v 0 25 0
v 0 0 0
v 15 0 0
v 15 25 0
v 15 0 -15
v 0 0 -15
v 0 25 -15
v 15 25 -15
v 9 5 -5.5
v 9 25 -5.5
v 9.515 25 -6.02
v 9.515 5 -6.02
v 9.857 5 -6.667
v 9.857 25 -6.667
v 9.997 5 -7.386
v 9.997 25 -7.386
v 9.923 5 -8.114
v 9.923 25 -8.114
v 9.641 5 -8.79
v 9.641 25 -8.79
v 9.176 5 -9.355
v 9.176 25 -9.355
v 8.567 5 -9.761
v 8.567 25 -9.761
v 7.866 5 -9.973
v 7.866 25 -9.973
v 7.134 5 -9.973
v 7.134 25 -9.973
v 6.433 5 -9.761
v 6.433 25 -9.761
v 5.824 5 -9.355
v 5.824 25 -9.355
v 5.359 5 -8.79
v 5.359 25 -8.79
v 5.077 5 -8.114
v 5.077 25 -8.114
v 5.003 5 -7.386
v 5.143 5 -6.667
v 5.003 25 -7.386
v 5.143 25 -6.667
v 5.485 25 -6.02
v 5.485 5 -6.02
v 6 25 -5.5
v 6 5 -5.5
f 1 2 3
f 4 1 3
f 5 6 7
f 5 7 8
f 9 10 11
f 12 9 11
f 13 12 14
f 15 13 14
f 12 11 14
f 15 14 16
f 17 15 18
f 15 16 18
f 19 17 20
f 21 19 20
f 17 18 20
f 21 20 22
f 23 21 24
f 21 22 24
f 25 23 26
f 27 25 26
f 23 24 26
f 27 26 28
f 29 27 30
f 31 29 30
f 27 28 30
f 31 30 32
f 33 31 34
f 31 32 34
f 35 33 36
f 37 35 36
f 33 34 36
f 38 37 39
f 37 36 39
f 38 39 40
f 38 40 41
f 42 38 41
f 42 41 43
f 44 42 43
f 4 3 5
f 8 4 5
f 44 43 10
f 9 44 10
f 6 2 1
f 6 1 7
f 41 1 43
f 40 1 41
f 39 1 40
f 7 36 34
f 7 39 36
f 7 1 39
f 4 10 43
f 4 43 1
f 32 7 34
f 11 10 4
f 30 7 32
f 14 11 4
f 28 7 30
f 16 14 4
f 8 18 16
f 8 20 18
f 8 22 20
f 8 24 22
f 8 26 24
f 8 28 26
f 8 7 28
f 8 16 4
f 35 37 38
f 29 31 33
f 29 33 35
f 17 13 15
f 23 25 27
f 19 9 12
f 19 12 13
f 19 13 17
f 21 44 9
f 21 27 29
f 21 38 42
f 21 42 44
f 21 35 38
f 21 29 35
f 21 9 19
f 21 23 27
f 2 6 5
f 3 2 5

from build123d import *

# Parameters (mm, degrees)
SKETCH1_W           = 15
SKETCH1_H           = 15
BOSS_EXTRUDE1_DEPTH = 25
CUT_EXTRUDE1_DEPTH  = 20


with BuildPart() as part:
    # Sketch1 → Boss-Extrude1 (new body)
    with BuildSketch(Plane(origin=(0, 0, 0), x_dir=(1, 0, 0), z_dir=(0, 1, 0))):
        with Locations((7.5, 7.5)):
            Rectangle(SKETCH1_W, SKETCH1_H)
    extrude(amount=BOSS_EXTRUDE1_DEPTH)

    # Sketch2 → Cut-Extrude1 (cut)
    with BuildSketch(Plane(origin=(0, 25, 0), x_dir=(1, 0, 0), z_dir=(0, 1, 0))):
        with BuildLine():
            Line((6, 5.5), (9, 5.5))
            ThreePointArc((9, 5.5), (7.5, 10), (6, 5.5))
        make_face()
    extrude(amount=-CUT_EXTRUDE1_DEPTH, mode=Mode.SUBTRACT)


solid = part.part
